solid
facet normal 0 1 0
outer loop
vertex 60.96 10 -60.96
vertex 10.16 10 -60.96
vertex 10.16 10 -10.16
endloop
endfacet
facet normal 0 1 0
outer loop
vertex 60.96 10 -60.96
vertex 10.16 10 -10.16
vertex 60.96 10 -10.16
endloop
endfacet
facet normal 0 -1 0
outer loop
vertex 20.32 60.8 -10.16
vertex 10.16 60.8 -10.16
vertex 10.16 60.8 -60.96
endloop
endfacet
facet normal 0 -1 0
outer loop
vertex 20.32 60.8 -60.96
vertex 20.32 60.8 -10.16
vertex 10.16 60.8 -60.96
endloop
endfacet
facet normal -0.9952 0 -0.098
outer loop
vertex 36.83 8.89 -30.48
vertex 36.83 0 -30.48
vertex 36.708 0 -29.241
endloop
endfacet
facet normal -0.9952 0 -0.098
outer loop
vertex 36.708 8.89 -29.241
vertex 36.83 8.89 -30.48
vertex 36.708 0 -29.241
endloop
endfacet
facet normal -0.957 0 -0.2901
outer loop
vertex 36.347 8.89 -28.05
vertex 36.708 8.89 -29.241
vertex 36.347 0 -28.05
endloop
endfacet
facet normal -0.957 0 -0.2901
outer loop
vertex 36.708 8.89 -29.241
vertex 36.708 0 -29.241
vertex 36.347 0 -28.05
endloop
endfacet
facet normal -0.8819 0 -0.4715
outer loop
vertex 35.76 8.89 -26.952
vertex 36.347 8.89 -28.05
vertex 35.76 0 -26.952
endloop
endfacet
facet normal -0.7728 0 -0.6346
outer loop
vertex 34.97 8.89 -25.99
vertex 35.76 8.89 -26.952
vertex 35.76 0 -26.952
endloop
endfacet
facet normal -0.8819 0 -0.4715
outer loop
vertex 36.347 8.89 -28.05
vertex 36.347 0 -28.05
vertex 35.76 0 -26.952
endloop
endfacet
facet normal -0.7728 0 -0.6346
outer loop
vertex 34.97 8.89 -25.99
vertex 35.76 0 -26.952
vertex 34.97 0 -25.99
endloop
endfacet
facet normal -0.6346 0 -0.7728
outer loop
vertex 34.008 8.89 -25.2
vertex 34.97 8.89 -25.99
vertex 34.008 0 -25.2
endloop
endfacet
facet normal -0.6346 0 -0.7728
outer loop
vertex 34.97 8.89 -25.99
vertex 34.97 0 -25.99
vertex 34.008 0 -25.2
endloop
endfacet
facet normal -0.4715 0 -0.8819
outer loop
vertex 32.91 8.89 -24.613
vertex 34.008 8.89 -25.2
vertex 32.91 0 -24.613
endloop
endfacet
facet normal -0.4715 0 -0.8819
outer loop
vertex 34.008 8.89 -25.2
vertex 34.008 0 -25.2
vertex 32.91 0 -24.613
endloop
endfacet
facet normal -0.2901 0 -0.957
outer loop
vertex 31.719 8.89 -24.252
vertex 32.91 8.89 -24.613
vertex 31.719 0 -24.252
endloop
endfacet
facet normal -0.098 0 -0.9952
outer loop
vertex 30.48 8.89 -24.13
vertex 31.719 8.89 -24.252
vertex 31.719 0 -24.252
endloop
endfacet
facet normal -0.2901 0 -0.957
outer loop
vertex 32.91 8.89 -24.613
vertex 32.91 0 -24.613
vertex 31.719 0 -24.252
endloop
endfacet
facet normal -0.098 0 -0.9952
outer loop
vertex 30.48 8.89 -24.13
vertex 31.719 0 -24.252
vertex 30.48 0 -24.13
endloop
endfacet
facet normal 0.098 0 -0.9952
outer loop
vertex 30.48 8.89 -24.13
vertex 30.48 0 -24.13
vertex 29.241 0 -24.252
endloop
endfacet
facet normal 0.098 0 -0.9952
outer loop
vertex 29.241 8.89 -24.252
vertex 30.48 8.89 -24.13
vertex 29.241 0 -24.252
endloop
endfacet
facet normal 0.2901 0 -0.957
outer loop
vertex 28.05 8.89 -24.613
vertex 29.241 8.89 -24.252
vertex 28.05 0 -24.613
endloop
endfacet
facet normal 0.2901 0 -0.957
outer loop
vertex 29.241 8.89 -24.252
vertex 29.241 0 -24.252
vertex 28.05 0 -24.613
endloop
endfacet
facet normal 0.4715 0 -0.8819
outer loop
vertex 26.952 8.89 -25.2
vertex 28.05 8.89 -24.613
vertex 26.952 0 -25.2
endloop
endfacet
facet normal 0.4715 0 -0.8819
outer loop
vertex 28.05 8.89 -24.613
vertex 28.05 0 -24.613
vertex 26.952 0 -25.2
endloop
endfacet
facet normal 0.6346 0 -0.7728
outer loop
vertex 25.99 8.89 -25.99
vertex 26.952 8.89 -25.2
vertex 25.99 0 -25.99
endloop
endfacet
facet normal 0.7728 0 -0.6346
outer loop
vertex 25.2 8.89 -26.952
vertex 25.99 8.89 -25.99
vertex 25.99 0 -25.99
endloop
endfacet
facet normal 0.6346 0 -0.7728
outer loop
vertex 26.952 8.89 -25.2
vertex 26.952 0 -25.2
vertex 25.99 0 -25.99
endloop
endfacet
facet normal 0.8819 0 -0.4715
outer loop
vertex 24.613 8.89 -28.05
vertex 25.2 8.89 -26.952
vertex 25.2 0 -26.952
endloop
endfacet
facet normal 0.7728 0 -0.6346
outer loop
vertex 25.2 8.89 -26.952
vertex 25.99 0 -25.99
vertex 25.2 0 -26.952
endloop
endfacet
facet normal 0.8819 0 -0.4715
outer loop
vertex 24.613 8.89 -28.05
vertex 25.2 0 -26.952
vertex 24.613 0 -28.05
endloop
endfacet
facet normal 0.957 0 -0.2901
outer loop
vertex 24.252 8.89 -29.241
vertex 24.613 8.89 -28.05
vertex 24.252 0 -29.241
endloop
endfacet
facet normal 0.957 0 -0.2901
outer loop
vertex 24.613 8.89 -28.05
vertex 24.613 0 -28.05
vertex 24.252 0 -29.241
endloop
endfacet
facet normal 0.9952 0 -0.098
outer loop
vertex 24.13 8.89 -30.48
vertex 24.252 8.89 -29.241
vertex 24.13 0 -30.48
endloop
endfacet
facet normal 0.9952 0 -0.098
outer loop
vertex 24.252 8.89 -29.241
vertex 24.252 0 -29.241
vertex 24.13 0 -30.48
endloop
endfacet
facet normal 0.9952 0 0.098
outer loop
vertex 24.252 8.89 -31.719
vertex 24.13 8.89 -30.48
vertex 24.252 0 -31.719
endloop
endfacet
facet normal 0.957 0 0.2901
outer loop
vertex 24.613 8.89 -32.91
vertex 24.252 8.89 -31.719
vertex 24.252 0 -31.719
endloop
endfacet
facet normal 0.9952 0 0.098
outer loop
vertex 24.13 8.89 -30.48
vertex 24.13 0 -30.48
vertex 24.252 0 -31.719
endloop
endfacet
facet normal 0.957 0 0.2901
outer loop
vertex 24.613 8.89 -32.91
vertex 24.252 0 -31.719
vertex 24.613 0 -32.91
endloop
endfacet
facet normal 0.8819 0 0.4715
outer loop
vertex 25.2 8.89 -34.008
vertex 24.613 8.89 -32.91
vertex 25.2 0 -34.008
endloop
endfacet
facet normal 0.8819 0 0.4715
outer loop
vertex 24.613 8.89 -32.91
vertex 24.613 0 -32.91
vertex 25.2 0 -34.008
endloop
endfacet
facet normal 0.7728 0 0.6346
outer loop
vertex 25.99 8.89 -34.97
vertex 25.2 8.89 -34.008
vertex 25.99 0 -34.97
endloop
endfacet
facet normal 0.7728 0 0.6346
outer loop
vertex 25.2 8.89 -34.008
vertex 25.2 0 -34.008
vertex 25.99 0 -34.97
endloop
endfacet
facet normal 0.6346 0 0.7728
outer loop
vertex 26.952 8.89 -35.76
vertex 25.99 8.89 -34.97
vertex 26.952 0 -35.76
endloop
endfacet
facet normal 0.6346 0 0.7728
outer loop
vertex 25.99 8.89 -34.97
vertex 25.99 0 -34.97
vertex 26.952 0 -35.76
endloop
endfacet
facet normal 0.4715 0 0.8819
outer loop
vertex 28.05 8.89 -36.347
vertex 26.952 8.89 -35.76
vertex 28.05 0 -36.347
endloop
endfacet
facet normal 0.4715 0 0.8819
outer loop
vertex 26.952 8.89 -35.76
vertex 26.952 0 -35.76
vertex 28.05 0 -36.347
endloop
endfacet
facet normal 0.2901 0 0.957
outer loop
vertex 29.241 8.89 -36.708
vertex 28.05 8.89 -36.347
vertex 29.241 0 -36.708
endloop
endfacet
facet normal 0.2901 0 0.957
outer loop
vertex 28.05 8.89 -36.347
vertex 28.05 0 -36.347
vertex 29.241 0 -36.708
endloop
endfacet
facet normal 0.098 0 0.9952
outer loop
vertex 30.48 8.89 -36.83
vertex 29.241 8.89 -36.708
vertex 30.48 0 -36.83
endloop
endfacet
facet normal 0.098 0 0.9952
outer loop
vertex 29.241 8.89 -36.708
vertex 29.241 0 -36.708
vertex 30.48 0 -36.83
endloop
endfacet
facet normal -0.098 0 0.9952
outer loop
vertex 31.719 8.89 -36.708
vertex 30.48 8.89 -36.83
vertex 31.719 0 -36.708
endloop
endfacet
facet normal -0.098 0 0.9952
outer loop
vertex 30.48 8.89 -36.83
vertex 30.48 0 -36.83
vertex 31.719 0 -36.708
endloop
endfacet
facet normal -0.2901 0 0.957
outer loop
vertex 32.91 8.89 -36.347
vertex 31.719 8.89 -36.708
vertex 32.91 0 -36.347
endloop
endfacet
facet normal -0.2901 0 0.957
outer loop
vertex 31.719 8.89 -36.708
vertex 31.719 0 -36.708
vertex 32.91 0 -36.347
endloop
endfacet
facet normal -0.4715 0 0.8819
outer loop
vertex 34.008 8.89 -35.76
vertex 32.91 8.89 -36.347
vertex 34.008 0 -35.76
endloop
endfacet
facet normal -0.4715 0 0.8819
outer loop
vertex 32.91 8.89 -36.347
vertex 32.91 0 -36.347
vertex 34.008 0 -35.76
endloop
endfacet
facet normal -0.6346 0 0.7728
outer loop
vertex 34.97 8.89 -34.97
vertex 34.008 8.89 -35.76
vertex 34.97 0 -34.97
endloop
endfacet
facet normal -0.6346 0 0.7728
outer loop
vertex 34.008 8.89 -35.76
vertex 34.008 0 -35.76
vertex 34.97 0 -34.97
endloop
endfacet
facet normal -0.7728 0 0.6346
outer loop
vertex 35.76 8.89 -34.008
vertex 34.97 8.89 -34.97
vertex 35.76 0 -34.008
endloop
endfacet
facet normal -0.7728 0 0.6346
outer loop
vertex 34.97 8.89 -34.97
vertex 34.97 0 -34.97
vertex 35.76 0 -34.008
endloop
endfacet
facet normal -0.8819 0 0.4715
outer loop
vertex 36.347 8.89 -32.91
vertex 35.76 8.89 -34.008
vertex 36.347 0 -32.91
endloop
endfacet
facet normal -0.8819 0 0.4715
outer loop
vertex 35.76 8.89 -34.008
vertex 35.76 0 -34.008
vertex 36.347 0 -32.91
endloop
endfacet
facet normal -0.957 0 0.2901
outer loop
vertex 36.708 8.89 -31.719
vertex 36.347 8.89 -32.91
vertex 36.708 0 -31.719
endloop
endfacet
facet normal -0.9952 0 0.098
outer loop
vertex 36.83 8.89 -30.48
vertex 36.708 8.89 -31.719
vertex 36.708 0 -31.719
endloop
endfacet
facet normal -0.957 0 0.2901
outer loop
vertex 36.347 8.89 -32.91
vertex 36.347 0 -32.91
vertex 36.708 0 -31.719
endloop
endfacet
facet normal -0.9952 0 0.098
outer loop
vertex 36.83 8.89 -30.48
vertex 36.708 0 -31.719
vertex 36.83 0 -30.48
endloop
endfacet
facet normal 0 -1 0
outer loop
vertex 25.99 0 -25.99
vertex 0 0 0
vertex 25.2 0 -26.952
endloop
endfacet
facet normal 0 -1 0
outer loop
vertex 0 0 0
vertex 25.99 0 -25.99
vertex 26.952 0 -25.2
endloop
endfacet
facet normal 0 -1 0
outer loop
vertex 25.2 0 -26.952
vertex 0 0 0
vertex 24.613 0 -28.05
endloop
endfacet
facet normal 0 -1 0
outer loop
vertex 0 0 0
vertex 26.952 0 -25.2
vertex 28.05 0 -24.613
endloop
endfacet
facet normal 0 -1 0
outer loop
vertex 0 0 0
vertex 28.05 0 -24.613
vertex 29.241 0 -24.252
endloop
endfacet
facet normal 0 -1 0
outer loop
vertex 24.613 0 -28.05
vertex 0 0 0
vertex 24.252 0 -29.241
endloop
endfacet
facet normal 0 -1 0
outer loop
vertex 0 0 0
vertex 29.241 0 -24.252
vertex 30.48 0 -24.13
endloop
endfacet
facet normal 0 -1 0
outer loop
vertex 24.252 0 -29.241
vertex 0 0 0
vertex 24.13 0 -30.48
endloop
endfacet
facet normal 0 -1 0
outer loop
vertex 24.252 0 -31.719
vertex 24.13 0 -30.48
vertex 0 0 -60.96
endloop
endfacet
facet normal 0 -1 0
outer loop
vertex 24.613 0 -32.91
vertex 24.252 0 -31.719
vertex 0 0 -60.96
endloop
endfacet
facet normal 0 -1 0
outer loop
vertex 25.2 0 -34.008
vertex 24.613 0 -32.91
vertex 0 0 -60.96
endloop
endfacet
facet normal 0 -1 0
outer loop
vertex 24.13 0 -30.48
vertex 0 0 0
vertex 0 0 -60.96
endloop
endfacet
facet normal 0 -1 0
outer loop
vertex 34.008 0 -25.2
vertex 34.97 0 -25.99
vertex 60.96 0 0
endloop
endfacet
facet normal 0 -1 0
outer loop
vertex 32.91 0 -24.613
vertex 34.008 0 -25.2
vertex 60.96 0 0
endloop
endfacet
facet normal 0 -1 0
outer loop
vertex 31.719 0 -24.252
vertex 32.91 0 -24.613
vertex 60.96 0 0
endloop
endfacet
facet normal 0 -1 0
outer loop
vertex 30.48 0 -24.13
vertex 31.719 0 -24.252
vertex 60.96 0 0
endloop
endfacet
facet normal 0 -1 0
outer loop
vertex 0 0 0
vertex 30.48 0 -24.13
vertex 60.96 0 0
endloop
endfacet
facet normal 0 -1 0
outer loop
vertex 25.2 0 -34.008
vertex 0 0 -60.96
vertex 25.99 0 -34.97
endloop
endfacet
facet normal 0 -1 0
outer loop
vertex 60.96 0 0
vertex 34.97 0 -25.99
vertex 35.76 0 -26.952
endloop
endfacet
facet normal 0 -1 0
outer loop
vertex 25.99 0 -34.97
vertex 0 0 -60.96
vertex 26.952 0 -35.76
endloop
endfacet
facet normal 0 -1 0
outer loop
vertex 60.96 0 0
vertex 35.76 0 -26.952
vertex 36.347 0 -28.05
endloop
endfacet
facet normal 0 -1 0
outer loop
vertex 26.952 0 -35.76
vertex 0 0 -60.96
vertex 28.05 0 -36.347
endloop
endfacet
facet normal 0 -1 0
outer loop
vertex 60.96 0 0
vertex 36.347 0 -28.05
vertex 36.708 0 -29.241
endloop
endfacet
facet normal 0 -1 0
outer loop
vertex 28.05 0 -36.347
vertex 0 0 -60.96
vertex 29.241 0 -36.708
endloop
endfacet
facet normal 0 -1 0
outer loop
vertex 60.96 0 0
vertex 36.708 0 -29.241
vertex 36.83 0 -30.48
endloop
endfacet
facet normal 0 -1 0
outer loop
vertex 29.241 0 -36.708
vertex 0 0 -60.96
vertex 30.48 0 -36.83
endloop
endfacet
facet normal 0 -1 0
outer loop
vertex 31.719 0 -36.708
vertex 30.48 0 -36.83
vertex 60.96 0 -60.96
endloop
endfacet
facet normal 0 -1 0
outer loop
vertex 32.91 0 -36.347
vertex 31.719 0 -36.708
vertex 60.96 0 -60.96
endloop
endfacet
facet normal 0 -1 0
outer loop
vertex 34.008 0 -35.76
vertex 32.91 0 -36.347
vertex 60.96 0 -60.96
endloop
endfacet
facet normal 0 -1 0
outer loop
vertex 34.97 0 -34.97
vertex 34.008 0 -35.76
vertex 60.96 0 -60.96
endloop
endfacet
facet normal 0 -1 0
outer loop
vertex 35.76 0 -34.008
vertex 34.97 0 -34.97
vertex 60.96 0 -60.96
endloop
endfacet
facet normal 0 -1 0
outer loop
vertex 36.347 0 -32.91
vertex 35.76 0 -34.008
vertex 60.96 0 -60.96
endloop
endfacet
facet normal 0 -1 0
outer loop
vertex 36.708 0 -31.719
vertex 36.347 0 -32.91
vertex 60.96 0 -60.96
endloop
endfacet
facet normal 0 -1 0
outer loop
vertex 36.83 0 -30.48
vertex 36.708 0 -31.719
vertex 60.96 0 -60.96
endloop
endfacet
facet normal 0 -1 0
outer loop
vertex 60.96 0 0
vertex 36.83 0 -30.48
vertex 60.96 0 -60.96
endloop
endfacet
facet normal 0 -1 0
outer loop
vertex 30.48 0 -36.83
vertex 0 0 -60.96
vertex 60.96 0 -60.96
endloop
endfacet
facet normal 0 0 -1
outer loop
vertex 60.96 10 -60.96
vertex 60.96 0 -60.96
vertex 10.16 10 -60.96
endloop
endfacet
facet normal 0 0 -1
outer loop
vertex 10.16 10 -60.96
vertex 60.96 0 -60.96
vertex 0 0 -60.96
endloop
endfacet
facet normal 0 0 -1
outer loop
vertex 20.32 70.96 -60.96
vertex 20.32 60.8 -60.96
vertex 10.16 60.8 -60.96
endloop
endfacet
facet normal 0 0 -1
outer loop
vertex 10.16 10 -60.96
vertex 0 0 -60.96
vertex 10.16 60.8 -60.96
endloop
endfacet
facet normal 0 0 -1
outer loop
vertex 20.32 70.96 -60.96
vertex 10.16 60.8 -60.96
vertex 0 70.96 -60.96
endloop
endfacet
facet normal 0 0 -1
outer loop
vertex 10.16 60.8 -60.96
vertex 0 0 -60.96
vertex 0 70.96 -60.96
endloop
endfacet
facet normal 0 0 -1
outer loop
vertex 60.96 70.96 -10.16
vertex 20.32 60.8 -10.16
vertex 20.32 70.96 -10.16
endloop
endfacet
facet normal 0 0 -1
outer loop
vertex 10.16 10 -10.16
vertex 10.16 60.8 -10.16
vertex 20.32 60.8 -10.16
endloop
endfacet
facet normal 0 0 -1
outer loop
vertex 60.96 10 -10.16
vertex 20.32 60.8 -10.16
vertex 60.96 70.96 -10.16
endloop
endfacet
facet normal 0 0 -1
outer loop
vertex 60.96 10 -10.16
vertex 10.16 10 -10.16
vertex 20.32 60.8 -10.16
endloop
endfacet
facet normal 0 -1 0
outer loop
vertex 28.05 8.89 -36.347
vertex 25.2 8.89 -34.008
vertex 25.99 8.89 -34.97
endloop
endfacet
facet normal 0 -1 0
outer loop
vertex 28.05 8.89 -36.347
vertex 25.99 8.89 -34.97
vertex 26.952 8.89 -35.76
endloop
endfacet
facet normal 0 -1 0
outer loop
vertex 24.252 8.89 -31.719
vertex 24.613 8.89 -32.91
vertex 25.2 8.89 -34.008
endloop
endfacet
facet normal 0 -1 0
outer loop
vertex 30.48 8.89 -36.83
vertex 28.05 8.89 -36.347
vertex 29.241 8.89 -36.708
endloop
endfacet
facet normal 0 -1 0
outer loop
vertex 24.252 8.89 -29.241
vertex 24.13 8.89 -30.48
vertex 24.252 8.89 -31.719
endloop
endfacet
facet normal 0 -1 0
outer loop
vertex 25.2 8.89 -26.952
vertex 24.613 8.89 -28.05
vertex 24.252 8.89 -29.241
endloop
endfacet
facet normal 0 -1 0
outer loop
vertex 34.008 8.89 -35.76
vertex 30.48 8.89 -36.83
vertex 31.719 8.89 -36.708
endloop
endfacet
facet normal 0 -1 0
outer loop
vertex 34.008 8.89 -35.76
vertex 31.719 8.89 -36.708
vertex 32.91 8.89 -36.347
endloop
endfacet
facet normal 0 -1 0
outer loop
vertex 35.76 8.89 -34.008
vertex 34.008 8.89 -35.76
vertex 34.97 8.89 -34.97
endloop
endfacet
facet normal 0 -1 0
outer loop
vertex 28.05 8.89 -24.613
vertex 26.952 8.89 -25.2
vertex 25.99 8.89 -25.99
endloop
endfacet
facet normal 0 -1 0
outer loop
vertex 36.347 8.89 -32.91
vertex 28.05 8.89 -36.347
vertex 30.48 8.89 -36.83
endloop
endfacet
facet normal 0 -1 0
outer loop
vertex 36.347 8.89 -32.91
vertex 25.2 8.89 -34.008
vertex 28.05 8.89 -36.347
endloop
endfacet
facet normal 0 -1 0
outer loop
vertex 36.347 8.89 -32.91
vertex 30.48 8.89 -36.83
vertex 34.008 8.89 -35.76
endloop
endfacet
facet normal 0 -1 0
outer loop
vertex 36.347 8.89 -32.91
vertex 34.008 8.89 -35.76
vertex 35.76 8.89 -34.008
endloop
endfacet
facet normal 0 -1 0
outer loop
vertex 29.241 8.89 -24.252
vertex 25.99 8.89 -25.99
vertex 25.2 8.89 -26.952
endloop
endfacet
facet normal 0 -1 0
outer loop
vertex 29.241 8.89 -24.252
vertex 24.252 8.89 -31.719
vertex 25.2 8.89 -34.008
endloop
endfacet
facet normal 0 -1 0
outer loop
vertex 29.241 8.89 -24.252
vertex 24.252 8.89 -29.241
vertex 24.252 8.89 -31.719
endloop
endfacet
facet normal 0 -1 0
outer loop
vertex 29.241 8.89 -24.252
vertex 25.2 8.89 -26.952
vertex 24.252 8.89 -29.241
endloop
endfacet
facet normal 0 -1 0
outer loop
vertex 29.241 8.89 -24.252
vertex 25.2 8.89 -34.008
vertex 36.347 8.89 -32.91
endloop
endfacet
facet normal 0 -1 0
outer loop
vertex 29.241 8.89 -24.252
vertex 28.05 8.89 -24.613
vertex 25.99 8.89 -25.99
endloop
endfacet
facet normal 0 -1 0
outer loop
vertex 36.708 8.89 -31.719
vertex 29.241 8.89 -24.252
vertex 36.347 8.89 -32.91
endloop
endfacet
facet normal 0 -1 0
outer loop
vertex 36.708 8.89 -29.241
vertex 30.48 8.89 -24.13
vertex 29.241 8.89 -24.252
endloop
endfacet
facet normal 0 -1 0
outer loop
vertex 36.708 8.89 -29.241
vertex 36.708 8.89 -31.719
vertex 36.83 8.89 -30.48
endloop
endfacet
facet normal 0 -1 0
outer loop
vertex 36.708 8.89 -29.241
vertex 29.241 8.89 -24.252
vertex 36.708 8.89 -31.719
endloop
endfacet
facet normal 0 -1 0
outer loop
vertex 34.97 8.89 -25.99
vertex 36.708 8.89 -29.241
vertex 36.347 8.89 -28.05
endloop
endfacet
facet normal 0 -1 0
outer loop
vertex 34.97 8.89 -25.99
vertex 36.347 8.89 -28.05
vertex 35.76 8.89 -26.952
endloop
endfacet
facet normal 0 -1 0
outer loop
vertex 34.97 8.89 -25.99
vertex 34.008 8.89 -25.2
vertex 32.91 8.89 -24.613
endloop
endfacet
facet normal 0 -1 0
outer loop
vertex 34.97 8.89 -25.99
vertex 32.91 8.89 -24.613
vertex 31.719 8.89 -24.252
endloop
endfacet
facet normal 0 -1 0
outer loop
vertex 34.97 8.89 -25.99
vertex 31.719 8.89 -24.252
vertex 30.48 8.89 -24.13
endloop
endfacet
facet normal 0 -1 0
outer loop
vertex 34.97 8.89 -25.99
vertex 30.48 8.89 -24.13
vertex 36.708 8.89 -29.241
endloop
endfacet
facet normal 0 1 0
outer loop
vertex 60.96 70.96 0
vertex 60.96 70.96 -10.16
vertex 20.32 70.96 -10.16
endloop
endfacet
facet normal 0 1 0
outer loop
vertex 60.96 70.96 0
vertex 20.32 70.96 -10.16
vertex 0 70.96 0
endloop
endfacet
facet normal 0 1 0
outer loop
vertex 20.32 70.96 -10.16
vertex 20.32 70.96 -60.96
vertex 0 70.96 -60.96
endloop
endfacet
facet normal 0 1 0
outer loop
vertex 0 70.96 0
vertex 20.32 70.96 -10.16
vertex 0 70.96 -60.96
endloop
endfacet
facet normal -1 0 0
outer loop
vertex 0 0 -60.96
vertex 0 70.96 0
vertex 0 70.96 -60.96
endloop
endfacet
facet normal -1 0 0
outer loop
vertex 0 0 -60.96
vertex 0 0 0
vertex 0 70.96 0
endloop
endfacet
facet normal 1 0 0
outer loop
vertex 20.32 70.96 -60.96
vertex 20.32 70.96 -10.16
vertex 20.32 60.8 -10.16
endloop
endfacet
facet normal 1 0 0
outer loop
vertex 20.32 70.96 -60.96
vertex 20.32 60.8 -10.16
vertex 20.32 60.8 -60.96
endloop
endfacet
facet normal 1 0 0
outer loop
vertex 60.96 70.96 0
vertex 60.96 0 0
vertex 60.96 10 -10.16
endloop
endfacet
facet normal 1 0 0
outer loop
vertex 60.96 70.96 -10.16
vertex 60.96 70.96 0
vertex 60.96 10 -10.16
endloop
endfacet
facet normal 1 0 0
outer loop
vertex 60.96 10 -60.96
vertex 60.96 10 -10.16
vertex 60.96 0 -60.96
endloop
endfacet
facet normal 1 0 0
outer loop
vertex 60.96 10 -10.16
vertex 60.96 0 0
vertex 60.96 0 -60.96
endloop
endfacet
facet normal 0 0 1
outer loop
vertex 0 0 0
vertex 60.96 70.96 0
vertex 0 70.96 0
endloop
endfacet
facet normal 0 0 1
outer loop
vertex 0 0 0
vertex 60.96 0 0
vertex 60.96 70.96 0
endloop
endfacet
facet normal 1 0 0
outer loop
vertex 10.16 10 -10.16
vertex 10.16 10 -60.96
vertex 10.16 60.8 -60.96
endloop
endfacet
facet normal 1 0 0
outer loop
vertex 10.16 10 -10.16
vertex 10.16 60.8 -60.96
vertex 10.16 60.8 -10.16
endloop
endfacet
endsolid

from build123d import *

# Parameters (mm, degrees)
SKETCH1_W           = 60.96
SKETCH1_H           = 60.96
BOSS_EXTRUDE1_DEPTH = 10
BOSS_EXTRUDE2_DEPTH = 60.96
SKETCH5_W           = 50.8
SKETCH5_H           = 10.16
BOSS_EXTRUDE3_DEPTH = 10.16
SKETCH6_R           = 6.35
CUT_EXTRUDE1_DEPTH  = 8.89


with BuildPart() as part:
    # Sketch1 → Boss-Extrude1 (new body)
    with BuildSketch(Plane(origin=(0, 0, 0), x_dir=(1, 0, 0), z_dir=(0, 1, 0))):
        with Locations((30.48, 30.48)):
            Rectangle(SKETCH1_W, SKETCH1_H)
    extrude(amount=BOSS_EXTRUDE1_DEPTH)

    # Sketch2 → Boss-Extrude2 (add)
    with BuildSketch(Plane(origin=(0, 10, 0), x_dir=(1, 0, 0), z_dir=(0, 1, 0))):
        Polygon((0, 60.96), (10.16, 60.96), (10.16, 10.16), (60.96, 10.16), (60.96, 0), (0, 0), align=None)
    extrude(amount=BOSS_EXTRUDE2_DEPTH)

    # Sketch5 → Boss-Extrude3 (add)
    with BuildSketch(Plane(origin=(10.16, 0, 0), x_dir=(0, 0, -1), z_dir=(1, 0, 0))):
        with Locations((35.56, 65.88)):
            Rectangle(SKETCH5_W, SKETCH5_H)
    extrude(amount=BOSS_EXTRUDE3_DEPTH)

    # Sketch6 → Cut-Extrude1 (cut)
    with BuildSketch(Plane.XZ):
        with Locations((30.48, -30.48)):
            Circle(SKETCH6_R)
    extrude(amount=-CUT_EXTRUDE1_DEPTH, mode=Mode.SUBTRACT)


solid = part.part
